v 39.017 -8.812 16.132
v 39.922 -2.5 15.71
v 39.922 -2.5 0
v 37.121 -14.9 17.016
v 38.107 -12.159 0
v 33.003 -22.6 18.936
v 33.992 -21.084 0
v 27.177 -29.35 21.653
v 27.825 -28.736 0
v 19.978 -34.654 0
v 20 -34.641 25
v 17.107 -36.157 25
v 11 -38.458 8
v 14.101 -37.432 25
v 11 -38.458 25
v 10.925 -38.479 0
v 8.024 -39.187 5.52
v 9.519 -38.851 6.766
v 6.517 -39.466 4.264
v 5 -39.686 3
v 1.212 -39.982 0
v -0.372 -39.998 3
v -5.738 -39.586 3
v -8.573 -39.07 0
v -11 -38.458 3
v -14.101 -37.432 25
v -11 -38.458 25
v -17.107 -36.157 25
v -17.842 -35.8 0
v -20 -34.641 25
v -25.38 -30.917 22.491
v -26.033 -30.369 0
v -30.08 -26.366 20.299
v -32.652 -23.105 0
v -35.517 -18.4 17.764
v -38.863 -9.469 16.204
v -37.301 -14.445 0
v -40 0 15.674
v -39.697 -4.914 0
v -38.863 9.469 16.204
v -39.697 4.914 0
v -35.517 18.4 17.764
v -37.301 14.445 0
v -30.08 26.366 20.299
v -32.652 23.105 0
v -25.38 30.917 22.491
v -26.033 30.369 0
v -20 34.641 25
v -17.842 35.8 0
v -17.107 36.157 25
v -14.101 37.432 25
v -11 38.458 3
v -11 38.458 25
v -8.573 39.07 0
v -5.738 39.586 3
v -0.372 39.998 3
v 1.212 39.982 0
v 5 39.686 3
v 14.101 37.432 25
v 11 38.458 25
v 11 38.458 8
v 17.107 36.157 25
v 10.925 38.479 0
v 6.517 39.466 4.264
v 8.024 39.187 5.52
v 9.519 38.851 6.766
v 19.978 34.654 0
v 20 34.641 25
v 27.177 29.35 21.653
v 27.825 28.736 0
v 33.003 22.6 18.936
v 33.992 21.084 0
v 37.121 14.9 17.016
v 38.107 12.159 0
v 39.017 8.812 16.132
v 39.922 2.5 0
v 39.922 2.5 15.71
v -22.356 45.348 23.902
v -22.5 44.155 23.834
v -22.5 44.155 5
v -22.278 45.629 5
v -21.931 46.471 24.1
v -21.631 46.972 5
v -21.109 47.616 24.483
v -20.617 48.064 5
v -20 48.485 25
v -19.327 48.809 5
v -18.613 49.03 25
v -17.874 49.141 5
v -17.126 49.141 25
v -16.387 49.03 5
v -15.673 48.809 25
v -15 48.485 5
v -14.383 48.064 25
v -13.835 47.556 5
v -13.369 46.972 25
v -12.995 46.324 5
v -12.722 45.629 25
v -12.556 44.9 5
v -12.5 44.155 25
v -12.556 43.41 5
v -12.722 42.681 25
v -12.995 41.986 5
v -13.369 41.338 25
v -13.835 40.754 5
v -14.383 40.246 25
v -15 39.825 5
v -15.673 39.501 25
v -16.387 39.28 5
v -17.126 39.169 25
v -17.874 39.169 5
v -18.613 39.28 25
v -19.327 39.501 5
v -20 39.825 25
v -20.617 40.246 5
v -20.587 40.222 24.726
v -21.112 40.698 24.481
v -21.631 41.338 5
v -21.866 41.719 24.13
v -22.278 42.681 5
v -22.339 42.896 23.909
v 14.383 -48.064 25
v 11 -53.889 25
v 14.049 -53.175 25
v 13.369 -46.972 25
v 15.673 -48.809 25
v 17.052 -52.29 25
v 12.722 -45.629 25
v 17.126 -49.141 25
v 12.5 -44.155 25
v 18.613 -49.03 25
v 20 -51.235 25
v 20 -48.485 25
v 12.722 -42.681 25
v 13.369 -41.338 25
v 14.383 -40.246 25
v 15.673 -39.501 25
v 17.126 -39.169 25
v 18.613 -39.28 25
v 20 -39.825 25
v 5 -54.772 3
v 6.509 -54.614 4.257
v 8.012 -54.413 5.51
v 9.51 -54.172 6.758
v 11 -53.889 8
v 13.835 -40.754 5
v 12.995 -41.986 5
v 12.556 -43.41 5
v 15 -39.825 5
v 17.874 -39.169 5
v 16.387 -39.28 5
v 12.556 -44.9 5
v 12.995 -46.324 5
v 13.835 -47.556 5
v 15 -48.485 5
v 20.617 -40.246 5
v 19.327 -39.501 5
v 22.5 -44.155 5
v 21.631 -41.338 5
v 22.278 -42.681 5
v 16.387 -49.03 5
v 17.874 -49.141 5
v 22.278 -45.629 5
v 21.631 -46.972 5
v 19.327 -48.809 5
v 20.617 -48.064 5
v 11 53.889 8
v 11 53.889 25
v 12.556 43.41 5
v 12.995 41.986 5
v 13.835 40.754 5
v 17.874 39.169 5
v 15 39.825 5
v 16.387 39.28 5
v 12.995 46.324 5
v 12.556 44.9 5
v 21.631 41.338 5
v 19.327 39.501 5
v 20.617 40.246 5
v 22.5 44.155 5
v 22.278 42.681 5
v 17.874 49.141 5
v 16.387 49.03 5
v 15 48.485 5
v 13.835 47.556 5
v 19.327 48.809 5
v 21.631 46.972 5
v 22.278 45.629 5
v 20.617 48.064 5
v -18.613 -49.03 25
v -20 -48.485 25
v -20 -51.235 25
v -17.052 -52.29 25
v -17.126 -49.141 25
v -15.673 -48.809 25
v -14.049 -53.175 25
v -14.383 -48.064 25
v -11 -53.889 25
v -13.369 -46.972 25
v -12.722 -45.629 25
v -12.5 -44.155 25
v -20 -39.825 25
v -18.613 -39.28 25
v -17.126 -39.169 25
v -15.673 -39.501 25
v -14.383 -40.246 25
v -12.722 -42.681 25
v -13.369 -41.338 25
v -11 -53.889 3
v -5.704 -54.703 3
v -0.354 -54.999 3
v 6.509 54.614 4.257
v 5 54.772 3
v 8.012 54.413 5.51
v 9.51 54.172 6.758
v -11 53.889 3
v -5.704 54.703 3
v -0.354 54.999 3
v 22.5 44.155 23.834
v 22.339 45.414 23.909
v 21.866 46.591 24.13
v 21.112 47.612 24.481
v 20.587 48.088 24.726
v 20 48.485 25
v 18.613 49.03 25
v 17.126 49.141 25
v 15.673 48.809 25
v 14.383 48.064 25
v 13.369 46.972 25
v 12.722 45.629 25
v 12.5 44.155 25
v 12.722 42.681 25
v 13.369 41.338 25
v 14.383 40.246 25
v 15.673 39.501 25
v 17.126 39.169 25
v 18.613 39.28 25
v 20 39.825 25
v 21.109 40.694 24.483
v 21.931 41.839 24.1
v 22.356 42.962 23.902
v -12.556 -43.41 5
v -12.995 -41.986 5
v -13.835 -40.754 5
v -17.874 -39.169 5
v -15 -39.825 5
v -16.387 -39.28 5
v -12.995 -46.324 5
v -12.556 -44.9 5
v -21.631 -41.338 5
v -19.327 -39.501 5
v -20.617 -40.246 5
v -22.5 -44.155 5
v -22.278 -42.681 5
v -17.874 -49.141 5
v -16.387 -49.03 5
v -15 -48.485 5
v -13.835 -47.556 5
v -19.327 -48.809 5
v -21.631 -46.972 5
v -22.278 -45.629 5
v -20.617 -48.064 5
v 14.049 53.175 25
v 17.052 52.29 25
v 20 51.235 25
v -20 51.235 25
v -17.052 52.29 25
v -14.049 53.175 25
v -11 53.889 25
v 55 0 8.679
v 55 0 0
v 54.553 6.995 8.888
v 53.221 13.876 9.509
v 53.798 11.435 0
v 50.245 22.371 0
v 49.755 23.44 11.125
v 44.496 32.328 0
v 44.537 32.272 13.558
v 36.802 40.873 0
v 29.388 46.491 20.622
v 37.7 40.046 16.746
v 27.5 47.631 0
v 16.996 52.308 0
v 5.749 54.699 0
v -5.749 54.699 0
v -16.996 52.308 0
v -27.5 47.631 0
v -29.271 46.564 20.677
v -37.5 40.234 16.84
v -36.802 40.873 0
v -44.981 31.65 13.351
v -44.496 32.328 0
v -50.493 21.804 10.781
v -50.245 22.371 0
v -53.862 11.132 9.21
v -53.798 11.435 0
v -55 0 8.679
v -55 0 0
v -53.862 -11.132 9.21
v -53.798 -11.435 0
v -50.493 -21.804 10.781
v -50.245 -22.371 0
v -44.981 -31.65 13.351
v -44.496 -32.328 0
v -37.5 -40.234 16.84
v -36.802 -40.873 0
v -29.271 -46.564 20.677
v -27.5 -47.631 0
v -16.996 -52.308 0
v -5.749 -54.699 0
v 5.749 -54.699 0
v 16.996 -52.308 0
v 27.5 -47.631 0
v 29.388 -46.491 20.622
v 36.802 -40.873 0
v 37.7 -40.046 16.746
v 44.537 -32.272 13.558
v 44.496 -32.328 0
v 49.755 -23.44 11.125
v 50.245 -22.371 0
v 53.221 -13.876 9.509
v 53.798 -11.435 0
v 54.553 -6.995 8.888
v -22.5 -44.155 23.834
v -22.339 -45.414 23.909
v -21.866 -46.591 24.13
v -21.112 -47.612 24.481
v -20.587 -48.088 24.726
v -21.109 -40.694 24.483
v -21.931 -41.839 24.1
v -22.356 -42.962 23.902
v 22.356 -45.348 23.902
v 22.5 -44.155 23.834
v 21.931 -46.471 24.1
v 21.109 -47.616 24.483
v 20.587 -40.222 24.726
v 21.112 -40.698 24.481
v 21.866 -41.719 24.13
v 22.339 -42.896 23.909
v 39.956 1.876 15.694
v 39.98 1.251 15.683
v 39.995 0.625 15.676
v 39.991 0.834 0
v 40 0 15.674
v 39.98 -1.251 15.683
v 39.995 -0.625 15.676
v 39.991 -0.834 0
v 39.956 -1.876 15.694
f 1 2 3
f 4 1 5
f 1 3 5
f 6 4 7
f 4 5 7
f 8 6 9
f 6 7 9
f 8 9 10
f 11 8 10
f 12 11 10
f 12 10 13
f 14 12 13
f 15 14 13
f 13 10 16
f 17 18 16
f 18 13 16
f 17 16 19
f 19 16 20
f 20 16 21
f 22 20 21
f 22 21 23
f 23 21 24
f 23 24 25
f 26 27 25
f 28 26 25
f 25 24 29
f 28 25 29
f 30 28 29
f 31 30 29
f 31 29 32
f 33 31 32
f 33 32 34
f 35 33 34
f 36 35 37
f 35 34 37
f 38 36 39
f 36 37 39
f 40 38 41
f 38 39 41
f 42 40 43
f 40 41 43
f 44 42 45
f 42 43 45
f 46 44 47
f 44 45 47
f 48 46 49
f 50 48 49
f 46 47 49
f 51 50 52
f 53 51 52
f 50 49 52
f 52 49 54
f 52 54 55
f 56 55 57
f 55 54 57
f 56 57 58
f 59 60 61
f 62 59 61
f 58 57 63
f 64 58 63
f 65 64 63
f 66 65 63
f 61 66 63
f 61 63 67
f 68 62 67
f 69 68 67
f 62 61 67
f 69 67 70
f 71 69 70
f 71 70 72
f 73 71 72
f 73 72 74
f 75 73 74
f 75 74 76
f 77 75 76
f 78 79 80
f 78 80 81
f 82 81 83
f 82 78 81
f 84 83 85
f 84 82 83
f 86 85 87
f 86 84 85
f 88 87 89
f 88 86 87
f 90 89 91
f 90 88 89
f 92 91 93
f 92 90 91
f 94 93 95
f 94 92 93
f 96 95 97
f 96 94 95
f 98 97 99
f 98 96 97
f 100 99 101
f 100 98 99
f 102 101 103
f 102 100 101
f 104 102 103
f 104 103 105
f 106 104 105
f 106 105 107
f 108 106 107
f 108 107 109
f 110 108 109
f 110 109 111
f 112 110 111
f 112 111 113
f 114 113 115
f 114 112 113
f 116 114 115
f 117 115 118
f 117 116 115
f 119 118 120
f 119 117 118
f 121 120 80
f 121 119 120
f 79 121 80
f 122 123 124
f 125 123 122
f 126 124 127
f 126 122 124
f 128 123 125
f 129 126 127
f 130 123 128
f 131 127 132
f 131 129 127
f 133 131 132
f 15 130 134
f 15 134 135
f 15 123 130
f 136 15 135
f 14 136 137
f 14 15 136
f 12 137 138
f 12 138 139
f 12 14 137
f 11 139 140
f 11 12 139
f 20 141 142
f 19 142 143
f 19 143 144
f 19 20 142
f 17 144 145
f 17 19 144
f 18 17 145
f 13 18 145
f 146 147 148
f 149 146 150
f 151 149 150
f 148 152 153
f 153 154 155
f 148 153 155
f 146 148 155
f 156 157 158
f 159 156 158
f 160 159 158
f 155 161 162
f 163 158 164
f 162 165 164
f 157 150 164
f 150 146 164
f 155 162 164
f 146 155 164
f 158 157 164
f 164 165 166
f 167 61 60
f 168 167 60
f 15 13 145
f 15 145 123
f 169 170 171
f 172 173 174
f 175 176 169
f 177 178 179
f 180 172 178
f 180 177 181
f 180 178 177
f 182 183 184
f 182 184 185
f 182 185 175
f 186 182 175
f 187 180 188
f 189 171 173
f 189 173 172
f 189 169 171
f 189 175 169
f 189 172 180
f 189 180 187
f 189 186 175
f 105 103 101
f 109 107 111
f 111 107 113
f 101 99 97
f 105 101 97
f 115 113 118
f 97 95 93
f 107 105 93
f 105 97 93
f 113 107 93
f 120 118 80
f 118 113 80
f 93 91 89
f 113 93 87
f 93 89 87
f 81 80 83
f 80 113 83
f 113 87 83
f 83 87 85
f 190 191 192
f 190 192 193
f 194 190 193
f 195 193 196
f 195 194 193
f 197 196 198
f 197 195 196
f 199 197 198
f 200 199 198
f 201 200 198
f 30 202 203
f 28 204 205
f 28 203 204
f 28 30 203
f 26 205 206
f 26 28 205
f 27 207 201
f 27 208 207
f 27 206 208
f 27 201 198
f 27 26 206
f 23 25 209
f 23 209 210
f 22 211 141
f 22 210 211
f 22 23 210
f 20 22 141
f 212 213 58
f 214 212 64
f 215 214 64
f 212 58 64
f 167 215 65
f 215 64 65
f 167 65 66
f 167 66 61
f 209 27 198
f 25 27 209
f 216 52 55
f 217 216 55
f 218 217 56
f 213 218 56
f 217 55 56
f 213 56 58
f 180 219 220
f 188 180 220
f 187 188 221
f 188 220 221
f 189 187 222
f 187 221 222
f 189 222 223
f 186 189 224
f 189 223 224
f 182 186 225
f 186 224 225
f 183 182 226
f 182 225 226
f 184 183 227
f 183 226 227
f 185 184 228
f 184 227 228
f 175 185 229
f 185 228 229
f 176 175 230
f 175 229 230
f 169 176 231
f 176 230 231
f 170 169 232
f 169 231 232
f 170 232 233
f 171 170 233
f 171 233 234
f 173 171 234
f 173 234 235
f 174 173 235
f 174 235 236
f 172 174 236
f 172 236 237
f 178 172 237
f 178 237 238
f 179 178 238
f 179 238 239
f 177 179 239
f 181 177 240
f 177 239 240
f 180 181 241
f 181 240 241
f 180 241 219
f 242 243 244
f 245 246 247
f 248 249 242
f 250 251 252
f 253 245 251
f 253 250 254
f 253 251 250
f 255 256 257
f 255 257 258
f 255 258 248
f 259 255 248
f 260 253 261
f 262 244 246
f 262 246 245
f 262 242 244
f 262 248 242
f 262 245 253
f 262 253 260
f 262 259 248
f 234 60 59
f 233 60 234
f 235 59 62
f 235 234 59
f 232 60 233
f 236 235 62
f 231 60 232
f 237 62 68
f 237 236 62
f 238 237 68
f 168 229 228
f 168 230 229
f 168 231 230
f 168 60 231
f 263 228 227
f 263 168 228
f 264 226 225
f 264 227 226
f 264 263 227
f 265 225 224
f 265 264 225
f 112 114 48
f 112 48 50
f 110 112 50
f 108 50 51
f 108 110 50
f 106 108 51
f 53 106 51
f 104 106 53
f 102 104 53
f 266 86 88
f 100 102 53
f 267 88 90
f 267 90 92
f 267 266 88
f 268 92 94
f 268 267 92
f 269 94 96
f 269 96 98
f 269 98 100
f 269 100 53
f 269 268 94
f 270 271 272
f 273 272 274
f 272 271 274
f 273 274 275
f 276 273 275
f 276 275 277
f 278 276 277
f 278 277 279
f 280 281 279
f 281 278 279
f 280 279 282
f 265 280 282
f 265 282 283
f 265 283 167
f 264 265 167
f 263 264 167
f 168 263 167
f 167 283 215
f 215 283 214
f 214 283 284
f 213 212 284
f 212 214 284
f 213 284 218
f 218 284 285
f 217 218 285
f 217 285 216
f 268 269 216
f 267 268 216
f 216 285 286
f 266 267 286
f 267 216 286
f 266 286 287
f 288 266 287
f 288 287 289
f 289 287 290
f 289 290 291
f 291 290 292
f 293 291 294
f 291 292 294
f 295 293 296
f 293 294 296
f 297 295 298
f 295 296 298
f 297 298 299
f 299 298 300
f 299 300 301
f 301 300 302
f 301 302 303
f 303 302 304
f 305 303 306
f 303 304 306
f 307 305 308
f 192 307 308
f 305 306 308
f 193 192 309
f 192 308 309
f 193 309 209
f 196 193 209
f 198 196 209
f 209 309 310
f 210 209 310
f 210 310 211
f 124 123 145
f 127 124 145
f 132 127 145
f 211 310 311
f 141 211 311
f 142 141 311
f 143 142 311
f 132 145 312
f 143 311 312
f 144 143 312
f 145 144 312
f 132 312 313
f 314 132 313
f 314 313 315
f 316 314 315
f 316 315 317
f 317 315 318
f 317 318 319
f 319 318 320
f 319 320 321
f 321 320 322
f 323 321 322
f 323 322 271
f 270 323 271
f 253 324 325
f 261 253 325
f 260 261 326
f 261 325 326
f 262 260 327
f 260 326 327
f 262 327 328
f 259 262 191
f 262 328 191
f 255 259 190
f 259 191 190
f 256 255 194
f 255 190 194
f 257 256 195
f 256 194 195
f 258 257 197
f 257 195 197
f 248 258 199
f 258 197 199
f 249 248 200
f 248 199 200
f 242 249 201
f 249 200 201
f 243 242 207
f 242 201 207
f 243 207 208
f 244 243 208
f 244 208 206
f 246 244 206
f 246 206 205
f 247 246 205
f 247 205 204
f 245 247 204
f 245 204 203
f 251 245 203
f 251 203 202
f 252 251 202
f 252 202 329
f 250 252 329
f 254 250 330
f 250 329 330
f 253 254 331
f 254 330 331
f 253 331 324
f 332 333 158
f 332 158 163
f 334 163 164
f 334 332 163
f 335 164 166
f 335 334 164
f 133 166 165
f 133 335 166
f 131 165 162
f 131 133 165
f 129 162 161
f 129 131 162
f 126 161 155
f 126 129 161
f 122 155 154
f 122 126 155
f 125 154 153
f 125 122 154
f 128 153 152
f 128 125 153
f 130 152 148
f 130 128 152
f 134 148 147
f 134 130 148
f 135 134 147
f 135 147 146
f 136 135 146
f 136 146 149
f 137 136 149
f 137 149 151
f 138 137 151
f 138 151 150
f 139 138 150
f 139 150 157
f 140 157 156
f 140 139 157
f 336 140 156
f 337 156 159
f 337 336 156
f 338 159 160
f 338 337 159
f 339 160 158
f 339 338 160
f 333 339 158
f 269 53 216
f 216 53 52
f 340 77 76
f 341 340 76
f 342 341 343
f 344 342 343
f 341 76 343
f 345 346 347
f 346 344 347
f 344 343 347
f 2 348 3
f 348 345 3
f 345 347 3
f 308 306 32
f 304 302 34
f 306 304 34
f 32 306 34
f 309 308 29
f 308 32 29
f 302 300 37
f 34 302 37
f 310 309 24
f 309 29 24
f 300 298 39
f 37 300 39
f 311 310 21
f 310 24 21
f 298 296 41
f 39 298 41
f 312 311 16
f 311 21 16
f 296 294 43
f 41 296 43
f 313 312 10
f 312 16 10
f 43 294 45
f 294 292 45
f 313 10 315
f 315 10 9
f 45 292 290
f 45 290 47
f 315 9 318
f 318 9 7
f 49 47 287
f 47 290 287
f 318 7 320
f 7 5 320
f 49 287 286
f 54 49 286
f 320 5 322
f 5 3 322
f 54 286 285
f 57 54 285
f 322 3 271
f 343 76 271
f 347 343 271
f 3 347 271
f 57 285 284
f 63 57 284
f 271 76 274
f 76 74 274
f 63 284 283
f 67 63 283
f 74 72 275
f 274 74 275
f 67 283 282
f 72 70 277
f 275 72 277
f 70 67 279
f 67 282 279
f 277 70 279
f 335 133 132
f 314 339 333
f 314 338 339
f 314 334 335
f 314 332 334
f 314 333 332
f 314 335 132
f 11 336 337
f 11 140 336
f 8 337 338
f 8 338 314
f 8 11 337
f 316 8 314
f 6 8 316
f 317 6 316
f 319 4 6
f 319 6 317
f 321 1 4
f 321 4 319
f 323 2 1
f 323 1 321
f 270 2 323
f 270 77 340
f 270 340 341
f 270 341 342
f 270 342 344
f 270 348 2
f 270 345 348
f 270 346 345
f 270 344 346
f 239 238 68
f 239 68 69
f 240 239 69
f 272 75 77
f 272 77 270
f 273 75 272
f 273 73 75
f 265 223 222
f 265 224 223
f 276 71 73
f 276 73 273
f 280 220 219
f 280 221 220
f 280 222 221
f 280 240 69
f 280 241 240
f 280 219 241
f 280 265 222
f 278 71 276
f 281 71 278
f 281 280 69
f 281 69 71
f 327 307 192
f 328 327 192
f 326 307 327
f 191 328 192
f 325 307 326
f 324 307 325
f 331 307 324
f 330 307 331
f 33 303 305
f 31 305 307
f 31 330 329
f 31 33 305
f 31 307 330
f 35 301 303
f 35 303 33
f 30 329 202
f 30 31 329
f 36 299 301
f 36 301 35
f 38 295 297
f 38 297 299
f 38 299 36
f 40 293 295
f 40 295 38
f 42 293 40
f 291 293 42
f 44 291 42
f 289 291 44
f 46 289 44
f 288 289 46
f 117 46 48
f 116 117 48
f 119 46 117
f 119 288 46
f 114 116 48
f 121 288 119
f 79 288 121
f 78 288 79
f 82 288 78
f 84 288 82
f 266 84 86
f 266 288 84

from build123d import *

# Parameters (mm, degrees)
F0_R             = 55
F1_DEPTH         = 25
F3_DEPTH         = 55.001
F3_DEPTH_BACK    = 55.001
F5_DEPTH         = 55.001
F5_DEPTH_BACK    = 55.001
F6_R             = 5
F8_DEPTH         = 20
F8_COPIES2_COUNT = 2


# Not quite as in the source:
# - a pattern or mirror of a feature is missing from the dataset's text; its kind, count and spacing are read off the source's solid


with BuildPart() as f1:
    # F0 (on Top) → F1 (new body)
    with BuildSketch(Plane.XY):
        Circle(F0_R)
        with BuildLine():
            ThreePointArc((39.9217985567, -2.5), (-40, 0), (39.9217985567, 2.5))
            ThreePointArc((39.9217985567, 2.5), (40, 0), (39.9217985567, -2.5))
        make_face(mode=Mode.SUBTRACT)
    extrude(amount=F1_DEPTH)

    # F2 (on Front) → F3 (cut, two sides)
    with BuildSketch(Plane.XZ) as f3_sk:
        Polygon((62.8901384102, 25), (20, 25), (62.8901384102, 5), align=None)
        Polygon((-62.8901384102, 5), (-20, 25), (-62.8901384102, 25), align=None)
    extrude(amount=-F3_DEPTH, mode=Mode.SUBTRACT)
    extrude(f3_sk.sketch, amount=F3_DEPTH_BACK, mode=Mode.SUBTRACT)

    # F4 (on Front) → F5 (cut, two sides)
    with BuildSketch(Plane.XZ) as f5_sk:
        Polygon((11, 25), (-11, 25), (-11, 3), (5, 3), (11, 8), align=None)
    extrude(amount=F5_DEPTH, mode=Mode.SUBTRACT)
    extrude(f5_sk.sketch, amount=-F5_DEPTH_BACK, mode=Mode.SUBTRACT)

    # F6 (on face) → F8 (cut, through all)
    with BuildSketch(Plane.XY.offset(25)):
        with Locations((17.5, 44.1549887905)):
            Circle(F6_R)
    f8 = extrude(amount=-F8_DEPTH, mode=Mode.SUBTRACT)

    # F8_copies: F8 across plane
    add(f8.mirror(Plane(origin=(0, 0, 0), x_dir=(0, 0, -1), z_dir=(-1, 0, 0))), mode=Mode.SUBTRACT)

    # F8_copies1: F8 across plane
    add(f8.mirror(Plane(origin=(0, 0, 0), x_dir=(0, 0, -1), z_dir=(0, -1, 0))), mode=Mode.SUBTRACT)

    # F8_copies2: F8 ×2 about axis
    f8_copies2_axis = Axis((0, 0, 0), (0, 0, 1))
    for i in range(1, F8_COPIES2_COUNT):
        add(f8.rotate(f8_copies2_axis, i * 360 / F8_COPIES2_COUNT), mode=Mode.SUBTRACT)


solid = f1.part
